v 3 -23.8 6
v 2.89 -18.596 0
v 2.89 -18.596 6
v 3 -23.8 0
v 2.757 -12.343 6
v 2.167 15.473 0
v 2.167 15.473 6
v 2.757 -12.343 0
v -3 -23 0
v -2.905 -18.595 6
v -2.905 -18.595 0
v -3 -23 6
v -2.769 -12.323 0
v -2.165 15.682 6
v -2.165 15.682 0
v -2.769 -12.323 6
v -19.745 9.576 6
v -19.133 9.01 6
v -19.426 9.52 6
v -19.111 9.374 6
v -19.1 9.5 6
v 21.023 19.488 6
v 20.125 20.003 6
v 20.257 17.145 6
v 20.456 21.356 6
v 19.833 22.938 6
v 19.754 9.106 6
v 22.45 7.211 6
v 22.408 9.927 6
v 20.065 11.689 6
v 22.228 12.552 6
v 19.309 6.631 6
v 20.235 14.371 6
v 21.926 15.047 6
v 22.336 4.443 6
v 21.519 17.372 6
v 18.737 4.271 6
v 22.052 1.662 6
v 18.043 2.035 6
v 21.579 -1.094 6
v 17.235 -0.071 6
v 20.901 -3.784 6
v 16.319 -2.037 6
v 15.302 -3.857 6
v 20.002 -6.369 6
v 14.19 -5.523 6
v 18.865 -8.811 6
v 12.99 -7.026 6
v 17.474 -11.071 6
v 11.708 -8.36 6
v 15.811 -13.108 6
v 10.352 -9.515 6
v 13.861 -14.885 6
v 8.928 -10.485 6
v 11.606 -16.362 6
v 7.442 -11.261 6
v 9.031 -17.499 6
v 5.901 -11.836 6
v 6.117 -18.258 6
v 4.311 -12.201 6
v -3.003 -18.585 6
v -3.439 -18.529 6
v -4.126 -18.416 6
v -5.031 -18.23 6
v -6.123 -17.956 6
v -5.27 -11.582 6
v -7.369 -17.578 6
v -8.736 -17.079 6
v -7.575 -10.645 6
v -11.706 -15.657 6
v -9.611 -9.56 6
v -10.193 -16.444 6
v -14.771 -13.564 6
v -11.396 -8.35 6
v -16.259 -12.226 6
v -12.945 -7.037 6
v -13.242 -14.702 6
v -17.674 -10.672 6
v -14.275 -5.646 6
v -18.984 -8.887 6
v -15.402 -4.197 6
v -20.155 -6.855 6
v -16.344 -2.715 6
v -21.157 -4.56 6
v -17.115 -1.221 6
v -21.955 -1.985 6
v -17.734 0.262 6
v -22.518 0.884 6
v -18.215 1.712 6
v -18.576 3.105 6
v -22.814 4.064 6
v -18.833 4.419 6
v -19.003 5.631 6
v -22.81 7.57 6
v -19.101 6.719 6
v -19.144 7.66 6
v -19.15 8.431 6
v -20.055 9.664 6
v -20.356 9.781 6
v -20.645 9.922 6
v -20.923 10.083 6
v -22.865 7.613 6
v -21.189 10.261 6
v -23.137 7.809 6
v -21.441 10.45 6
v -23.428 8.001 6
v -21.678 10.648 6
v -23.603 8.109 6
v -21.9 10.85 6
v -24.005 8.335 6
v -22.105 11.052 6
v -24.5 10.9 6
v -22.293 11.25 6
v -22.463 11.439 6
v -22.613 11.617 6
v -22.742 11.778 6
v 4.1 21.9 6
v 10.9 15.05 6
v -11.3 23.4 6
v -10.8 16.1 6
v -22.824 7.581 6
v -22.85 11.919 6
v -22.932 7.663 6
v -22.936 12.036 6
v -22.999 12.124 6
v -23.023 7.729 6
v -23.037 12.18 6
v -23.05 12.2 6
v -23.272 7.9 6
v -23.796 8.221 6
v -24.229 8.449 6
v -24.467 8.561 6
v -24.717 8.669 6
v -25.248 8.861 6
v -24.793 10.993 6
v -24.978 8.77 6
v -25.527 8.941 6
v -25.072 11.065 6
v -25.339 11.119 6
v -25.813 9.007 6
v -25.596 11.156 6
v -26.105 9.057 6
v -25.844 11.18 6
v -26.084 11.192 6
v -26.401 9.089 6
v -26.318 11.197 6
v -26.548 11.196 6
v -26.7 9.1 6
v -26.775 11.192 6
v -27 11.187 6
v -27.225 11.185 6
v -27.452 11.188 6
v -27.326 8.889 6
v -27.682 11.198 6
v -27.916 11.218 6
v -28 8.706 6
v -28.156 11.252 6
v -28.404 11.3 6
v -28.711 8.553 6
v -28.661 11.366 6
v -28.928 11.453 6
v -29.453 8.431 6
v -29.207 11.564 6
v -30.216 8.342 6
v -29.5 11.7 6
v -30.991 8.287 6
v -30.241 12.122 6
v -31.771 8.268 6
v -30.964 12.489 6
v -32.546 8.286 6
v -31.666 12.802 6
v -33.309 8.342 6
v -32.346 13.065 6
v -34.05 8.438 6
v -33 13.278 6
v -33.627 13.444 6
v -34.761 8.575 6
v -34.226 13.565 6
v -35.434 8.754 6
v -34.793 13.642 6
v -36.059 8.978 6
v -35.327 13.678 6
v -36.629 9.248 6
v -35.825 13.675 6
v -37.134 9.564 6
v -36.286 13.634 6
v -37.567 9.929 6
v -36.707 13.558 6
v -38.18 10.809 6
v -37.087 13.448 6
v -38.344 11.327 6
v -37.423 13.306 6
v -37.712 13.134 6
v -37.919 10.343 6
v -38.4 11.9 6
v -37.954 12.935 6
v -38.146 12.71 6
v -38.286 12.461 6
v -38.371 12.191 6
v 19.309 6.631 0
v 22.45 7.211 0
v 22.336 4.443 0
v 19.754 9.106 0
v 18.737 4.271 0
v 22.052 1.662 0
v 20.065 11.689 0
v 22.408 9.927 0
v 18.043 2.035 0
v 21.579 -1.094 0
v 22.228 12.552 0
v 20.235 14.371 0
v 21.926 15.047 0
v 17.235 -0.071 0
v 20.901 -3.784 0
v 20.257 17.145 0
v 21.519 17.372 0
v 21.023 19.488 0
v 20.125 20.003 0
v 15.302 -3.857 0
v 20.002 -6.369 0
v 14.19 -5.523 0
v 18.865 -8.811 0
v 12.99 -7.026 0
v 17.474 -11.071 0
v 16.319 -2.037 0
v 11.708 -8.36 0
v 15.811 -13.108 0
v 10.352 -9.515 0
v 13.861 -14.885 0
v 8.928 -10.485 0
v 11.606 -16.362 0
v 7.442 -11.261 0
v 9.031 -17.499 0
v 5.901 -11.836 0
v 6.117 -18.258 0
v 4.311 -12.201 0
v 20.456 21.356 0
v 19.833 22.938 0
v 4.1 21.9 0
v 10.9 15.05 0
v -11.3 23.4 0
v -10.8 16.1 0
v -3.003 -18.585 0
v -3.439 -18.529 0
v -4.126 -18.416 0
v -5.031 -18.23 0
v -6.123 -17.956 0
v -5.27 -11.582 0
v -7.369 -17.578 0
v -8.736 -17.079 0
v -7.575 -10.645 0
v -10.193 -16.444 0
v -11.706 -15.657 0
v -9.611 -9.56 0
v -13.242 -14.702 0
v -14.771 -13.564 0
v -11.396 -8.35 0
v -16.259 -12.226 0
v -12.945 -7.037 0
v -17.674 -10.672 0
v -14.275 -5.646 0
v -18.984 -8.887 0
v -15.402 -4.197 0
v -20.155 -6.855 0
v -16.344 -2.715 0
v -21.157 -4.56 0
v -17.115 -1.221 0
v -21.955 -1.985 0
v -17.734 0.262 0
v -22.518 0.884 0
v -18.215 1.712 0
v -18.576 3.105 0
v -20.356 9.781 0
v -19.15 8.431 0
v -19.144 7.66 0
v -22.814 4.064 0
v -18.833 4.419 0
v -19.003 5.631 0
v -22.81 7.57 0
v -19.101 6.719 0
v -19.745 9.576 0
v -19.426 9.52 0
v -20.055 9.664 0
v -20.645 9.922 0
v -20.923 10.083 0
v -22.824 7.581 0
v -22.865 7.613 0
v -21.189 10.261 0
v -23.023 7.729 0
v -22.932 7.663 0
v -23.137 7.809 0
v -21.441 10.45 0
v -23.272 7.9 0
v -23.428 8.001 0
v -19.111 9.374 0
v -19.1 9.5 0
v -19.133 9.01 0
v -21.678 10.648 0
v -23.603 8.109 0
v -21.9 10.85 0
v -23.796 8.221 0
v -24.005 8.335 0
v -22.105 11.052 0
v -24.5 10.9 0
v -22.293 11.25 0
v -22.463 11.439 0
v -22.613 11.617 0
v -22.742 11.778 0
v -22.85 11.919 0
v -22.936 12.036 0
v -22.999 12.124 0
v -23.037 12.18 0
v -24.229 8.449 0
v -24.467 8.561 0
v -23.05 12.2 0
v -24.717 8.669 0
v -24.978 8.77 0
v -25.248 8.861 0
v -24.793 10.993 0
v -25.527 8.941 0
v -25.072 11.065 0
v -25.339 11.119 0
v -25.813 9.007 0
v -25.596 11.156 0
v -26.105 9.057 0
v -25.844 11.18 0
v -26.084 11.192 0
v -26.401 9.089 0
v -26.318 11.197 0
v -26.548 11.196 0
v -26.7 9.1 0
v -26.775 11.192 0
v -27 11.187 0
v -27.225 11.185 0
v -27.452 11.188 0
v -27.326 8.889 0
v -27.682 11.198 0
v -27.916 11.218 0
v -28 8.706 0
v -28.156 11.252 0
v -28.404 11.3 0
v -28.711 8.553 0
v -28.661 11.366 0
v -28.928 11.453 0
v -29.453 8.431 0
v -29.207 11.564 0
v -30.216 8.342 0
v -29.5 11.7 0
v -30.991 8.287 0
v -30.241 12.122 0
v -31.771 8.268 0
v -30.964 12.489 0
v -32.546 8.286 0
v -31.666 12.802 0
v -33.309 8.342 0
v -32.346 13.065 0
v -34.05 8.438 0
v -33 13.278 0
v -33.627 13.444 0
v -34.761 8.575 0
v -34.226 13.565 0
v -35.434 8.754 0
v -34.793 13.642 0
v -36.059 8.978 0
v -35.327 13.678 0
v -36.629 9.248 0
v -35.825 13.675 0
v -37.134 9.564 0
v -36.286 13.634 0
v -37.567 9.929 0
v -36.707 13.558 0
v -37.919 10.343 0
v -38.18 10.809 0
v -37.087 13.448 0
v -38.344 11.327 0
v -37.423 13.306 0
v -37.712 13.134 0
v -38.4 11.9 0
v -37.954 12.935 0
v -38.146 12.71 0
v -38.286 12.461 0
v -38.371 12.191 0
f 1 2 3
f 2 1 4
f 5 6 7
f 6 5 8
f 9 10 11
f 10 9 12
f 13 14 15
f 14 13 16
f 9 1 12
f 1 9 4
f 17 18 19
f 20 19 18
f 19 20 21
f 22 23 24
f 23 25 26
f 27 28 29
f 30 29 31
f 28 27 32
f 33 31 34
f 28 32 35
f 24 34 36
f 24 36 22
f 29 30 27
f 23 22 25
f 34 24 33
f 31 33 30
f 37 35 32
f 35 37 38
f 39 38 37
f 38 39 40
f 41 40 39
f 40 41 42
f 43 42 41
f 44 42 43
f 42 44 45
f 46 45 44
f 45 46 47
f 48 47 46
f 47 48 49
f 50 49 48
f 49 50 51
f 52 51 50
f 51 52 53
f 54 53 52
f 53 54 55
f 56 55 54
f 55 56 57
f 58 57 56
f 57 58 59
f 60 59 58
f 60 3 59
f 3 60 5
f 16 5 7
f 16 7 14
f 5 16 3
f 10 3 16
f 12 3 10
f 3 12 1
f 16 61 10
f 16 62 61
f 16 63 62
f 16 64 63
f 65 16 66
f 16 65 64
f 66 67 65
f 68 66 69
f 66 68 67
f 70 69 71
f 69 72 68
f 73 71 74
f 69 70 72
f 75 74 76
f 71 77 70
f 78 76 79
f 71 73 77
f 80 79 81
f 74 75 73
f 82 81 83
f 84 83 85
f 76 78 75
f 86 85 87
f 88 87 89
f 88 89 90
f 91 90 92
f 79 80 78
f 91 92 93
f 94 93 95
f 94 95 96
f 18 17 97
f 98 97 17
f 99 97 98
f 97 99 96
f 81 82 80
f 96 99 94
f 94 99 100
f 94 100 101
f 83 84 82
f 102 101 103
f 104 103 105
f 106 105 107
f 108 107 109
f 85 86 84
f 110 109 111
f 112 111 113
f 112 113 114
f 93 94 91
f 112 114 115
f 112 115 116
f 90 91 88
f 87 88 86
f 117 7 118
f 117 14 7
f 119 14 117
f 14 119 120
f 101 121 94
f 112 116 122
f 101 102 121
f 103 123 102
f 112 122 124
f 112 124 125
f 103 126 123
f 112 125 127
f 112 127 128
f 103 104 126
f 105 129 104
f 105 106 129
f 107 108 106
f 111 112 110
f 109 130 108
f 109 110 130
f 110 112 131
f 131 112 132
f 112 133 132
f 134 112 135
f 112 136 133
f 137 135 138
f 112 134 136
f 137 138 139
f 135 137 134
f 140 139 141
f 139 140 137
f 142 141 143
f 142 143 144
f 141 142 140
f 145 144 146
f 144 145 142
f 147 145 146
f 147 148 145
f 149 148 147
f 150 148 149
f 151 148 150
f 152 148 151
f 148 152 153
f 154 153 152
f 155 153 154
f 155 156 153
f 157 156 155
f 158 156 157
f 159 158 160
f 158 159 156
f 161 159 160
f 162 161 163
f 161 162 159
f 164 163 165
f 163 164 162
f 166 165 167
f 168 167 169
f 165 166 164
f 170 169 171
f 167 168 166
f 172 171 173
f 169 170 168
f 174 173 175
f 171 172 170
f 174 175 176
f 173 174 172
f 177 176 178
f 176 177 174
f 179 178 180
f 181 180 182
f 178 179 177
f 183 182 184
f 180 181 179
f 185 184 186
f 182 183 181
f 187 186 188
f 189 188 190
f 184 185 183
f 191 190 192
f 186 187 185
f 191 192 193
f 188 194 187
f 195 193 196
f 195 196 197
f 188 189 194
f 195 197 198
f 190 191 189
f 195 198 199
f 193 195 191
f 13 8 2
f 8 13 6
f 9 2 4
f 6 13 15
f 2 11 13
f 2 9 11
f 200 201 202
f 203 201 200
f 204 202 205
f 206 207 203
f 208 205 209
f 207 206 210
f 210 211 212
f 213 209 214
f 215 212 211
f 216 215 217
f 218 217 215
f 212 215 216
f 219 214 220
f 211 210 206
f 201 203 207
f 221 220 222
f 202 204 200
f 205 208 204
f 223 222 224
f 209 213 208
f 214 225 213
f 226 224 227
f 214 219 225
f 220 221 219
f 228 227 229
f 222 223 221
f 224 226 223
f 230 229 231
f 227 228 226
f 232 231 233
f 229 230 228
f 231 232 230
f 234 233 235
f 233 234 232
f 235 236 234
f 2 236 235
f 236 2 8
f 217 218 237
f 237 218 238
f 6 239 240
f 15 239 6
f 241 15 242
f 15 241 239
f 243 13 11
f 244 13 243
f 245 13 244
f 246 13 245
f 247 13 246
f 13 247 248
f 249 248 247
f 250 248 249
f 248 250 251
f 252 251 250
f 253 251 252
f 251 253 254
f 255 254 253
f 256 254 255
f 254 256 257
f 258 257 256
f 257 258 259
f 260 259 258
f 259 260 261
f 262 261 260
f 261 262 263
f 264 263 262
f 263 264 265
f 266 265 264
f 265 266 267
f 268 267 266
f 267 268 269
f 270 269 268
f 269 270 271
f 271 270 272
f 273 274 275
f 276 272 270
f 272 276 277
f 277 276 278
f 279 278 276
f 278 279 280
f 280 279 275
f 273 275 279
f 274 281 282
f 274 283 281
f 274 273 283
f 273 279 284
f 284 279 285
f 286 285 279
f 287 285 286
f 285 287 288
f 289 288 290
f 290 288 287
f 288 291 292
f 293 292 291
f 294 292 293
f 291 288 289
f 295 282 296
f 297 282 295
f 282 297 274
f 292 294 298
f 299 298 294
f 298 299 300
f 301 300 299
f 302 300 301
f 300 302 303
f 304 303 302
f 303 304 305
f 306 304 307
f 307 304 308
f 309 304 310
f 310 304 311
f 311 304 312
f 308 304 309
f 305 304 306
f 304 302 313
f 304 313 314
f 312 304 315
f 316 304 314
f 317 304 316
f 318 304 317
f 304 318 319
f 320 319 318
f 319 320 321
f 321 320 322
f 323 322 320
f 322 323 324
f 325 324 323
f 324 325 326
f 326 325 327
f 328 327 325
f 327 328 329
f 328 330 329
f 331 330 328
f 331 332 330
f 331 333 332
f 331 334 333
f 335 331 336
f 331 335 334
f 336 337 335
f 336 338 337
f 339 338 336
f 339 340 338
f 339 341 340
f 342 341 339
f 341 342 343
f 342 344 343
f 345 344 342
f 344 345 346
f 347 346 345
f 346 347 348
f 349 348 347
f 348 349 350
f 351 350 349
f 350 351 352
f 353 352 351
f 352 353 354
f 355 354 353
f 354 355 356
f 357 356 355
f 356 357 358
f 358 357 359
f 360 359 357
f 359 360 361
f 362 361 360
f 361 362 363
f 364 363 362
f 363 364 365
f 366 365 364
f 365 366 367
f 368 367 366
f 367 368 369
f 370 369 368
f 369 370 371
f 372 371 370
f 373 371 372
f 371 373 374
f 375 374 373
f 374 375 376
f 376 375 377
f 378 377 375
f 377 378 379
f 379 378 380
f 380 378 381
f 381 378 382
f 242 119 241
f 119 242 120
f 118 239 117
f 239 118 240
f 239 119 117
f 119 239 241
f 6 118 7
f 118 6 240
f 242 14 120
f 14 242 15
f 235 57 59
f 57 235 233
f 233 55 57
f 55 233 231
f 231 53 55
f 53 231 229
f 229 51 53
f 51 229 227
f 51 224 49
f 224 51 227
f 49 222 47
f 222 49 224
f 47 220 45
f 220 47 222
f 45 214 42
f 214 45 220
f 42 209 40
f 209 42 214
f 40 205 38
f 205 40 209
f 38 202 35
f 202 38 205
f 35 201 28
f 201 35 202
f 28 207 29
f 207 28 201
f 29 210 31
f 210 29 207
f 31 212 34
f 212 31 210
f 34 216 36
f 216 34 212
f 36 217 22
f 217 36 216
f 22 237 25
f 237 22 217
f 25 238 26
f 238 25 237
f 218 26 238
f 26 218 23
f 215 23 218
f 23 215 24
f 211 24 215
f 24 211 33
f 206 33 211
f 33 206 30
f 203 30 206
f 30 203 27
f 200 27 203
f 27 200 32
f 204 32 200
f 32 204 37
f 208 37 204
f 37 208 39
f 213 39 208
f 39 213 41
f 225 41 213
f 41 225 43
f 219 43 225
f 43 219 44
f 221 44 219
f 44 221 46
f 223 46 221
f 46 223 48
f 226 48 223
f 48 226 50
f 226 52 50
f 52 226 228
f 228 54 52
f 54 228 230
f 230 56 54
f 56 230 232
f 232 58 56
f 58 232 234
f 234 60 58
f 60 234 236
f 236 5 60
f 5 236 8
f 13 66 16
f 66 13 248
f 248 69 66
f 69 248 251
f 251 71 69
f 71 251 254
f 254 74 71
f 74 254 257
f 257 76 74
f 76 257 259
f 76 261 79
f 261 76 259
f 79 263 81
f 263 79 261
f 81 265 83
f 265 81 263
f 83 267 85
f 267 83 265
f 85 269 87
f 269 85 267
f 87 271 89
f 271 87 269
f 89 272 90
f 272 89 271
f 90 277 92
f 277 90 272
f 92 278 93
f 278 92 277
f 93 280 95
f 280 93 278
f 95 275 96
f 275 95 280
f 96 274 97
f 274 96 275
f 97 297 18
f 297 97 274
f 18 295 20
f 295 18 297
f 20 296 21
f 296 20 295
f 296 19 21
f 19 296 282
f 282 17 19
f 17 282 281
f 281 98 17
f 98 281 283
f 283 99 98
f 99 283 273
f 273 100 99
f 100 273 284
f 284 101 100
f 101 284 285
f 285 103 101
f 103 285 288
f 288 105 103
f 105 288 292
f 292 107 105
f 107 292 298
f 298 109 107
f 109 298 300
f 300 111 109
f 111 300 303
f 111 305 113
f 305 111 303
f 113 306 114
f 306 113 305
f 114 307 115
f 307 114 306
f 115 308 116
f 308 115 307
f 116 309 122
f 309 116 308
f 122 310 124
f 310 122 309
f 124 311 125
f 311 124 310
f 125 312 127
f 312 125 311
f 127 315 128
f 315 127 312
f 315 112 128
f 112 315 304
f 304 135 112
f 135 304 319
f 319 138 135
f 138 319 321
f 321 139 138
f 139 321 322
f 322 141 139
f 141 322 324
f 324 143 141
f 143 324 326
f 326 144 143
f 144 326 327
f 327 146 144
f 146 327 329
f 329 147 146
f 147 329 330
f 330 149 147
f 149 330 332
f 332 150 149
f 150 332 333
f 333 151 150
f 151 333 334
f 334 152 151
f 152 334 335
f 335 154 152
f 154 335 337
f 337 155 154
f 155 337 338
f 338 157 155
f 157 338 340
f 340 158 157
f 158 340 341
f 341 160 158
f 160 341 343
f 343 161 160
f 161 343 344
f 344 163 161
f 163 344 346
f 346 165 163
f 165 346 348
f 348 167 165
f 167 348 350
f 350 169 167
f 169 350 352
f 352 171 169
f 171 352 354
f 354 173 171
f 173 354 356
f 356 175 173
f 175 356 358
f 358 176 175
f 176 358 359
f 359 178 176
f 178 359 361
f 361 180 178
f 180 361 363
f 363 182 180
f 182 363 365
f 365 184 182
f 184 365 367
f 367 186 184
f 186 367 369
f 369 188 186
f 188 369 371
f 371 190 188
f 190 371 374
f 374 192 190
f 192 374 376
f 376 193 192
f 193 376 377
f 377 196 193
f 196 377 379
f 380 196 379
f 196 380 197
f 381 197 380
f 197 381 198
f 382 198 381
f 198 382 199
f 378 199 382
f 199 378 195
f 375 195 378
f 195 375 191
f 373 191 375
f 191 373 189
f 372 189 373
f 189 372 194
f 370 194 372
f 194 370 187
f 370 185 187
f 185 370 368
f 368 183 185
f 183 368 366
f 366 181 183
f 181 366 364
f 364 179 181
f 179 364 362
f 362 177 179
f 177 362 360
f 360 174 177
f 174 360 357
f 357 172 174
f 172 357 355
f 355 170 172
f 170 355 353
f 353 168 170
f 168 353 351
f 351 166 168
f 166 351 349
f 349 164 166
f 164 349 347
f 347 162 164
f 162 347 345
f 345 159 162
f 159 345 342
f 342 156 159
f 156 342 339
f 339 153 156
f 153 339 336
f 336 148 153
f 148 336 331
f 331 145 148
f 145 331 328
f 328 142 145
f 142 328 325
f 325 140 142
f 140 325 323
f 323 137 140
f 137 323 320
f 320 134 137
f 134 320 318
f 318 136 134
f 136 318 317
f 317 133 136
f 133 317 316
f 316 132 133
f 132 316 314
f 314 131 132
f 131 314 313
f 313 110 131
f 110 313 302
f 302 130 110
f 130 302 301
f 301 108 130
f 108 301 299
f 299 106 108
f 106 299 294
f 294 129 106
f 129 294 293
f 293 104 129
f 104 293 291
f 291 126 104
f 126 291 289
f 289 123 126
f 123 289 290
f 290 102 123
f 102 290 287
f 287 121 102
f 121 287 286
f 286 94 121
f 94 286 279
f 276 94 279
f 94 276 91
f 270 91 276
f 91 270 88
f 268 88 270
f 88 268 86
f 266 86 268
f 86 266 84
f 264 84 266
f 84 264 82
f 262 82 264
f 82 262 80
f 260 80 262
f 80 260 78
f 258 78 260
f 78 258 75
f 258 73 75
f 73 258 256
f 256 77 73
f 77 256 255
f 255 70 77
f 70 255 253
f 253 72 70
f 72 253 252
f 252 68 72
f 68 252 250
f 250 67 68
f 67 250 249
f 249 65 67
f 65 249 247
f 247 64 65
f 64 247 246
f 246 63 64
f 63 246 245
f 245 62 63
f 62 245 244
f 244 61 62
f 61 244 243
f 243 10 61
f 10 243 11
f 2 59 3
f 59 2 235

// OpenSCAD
use <../../openscad/bezier-eh.scad>;

module Hammer(shrinkage=0, cz=3) {
  render() union() {
    se=shrinkage/2;
    //--------------------------------------------------------------------------------------
    // древко
    dTopCX=5.1;             // ширина верхушки древка
    dBotCX=7;               // ширина дна древка
    dCY=47;                 // высота древка
    // кривизна 
    bRCY=-0.8;
    //--------------------------------------------------------------------------------------
    linear_extrude(height=cz)
      polygon(points=[
         [(-dTopCX/2)+se, ( dCY/2)-se-2]
        ,[( dTopCX/2)-se, ( dCY/2)-se-2]
        ,[( dBotCX/2)-se, (-dCY/2+bRCY)+se]
        ,[(-dBotCX/2)+se, (-dCY/2)+se]
        ]);
    //--------------------------------------------------------------------------------------
    // Молот
    hCX=23.2;             // Ширина головки
    hCY=8.1;              // Высота головки
    bCX=7.3;              // Наклонная бойка
    // кривизна 
    dLCX=-0.5;
    dLCY=0.4;
    dRCX=-0;
    dRCY=-1.1;
    dbRCX=0.5-shrinkage;
    dbRCY=-0.85;
    dbLCX=0;
    dbLCY=0.2;
    //--------------------------------------------------------------------------------------
    translate([0.3, (dCY-hCY)/2, 0]) linear_extrude(height=cz)
      polygon(points=[
         [(-hCX/2)+se+dLCX, (hCY/2)-se+dLCY]
        ,[(hCX/2-bCX)-se+dRCX, (hCY/2)-se+dRCY]
        ,[(hCX/2)-se+dbRCX, (-hCY/2)+se+dbRCY]
        ,[(-hCX/2)+se+dbLCX, (-hCY/2)+se+dbLCY]
        ]);
    //--------------------------------------------------------------------------------------
  }
}

module SickleBezierVis(shrinkage=0) {
  //--------------------------------------------------------------------------------------
  // Серп
  se=shrinkage;
  BezierVisualize([
       /*B*/[-23.31+se, 7.07+se],
       /*C*/OFFSET([-1.1, -24.5]),     /*C*/SHARP(),                  [-3.35+se, -19.1+se],
       /*C*/OFFSET([0, 0]),            /*C*/OFFSET([0, 0]),           [3.35-se, -19.1+se],
       /*C*/OFFSET([23.5-se, 0.3+se]), /*C*/OFFSET([5.3-se, -10+se]), [19.416+se/(3/2), 24.4378-se*3], // Острие
       /*C*/OFFSET([2.5, -19.8]),      /*C*/OFFSET([11, .25]),        [3.18-se, -11.85-se],
       /*C*/OFFSET([0, 0]),            /*C*/OFFSET([0, 0]),           [-3.18+se, -11.85-se],
       /*C*/OFFSET([-17.75-se, 5-se]), /*C*/SHARP(),                  [-18.6-se/2, 10-se/2],
       /*C*/OFFSET([-2.2, 0]),         /*C*/SHARP(),                  [-23.05, 12.7-se/2],
       /*C*/OFFSET([0, 0]),            /*C*/OFFSET([0, 0]),           [-24.5, 11.4-se/2],
       /*C*/OFFSET([-2, 0.7]),         /*C*/OFFSET([2, -1]),          [-29.5, 12.2-se/2],
       /*C*/OFFSET([-5, 3]),           /*C*/OFFSET([0, 2]),           [-38.9+se/2, 11.9],
       /*C*/OFFSET([0, -4]),           /*C*/OFFSET([-4, -1.5]),       [-26.7, 8.6+se/2],
       /*C*/OFFSET([0, 0.2]),          /*C*/OFFSET([0, 1]),           [-23.31+se/2, 7.07+se/2],
  ]);
  //--------------------------------------------------------------------------------------
}

module Sickle(shrinkage=0, cz=3) {
  //--------------------------------------------------------------------------------------
  // Серп
  se=shrinkage/2;
  linear_extrude(height=cz)
    polygon(Bezier([
       /*B*/[-23.31+se, 7.07+se],
       /*C*/OFFSET([-1.1, -24.5]),     /*C*/SHARP(),                  [-3.35+se, -19.1+se],
       /*C*/OFFSET([0, 0]),            /*C*/OFFSET([0, 0]),           [3.35-se, -19.1+se],
       /*C*/OFFSET([23.5-se, 0.3+se]), /*C*/OFFSET([5.3-se*2, -10+se]), [19.416+se/1.2, 24.4378-se*3], // Острие
       /*C*/OFFSET([2.5, -19.8]),      /*C*/OFFSET([11, .25]),        [3.18-se, -11.85-se],
       /*C*/OFFSET([0, 0]),            /*C*/OFFSET([0, 0]),           [-3.18+se, -11.85-se],
       /*C*/OFFSET([-17.75-se, 5-se]), /*C*/SHARP(),                  [-18.6-se, 10-se],
       /*C*/OFFSET([-2.2, 0]),         /*C*/SHARP(),                  [-23.05, 12.7-se],
       /*C*/OFFSET([0, 0]),            /*C*/OFFSET([0, 0]),           [-24.5, 11.4-se],
       /*C*/OFFSET([-2, 0.7]),         /*C*/OFFSET([2, -1]),          [-29.5, 12.2-se],
       /*C*/OFFSET([-5, 3]),           /*C*/OFFSET([0, 2]),           [-38.9+se, 11.9],
       /*C*/OFFSET([0, -4]),           /*C*/OFFSET([-4, -1.5]),       [-26.7, 8.6+se],
       /*C*/OFFSET([2, 0]),            /*C*/OFFSET([0, 0]),           [-23.31+se, 7.07+se],
    ]));
  //--------------------------------------------------------------------------------------
}

module HammerAndSickle(shrinkage=0, cz=6) { 
  union() {
    Hammer(shrinkage, cz);
    Sickle(shrinkage, cz);
  }
}

//%translate([-1.75, 9, 0]) rotate([0, 0, -45]) import("sm.stl");
//SickleBezierVis(1);
%HammerAndSickle();
HammerAndSickle(1);
